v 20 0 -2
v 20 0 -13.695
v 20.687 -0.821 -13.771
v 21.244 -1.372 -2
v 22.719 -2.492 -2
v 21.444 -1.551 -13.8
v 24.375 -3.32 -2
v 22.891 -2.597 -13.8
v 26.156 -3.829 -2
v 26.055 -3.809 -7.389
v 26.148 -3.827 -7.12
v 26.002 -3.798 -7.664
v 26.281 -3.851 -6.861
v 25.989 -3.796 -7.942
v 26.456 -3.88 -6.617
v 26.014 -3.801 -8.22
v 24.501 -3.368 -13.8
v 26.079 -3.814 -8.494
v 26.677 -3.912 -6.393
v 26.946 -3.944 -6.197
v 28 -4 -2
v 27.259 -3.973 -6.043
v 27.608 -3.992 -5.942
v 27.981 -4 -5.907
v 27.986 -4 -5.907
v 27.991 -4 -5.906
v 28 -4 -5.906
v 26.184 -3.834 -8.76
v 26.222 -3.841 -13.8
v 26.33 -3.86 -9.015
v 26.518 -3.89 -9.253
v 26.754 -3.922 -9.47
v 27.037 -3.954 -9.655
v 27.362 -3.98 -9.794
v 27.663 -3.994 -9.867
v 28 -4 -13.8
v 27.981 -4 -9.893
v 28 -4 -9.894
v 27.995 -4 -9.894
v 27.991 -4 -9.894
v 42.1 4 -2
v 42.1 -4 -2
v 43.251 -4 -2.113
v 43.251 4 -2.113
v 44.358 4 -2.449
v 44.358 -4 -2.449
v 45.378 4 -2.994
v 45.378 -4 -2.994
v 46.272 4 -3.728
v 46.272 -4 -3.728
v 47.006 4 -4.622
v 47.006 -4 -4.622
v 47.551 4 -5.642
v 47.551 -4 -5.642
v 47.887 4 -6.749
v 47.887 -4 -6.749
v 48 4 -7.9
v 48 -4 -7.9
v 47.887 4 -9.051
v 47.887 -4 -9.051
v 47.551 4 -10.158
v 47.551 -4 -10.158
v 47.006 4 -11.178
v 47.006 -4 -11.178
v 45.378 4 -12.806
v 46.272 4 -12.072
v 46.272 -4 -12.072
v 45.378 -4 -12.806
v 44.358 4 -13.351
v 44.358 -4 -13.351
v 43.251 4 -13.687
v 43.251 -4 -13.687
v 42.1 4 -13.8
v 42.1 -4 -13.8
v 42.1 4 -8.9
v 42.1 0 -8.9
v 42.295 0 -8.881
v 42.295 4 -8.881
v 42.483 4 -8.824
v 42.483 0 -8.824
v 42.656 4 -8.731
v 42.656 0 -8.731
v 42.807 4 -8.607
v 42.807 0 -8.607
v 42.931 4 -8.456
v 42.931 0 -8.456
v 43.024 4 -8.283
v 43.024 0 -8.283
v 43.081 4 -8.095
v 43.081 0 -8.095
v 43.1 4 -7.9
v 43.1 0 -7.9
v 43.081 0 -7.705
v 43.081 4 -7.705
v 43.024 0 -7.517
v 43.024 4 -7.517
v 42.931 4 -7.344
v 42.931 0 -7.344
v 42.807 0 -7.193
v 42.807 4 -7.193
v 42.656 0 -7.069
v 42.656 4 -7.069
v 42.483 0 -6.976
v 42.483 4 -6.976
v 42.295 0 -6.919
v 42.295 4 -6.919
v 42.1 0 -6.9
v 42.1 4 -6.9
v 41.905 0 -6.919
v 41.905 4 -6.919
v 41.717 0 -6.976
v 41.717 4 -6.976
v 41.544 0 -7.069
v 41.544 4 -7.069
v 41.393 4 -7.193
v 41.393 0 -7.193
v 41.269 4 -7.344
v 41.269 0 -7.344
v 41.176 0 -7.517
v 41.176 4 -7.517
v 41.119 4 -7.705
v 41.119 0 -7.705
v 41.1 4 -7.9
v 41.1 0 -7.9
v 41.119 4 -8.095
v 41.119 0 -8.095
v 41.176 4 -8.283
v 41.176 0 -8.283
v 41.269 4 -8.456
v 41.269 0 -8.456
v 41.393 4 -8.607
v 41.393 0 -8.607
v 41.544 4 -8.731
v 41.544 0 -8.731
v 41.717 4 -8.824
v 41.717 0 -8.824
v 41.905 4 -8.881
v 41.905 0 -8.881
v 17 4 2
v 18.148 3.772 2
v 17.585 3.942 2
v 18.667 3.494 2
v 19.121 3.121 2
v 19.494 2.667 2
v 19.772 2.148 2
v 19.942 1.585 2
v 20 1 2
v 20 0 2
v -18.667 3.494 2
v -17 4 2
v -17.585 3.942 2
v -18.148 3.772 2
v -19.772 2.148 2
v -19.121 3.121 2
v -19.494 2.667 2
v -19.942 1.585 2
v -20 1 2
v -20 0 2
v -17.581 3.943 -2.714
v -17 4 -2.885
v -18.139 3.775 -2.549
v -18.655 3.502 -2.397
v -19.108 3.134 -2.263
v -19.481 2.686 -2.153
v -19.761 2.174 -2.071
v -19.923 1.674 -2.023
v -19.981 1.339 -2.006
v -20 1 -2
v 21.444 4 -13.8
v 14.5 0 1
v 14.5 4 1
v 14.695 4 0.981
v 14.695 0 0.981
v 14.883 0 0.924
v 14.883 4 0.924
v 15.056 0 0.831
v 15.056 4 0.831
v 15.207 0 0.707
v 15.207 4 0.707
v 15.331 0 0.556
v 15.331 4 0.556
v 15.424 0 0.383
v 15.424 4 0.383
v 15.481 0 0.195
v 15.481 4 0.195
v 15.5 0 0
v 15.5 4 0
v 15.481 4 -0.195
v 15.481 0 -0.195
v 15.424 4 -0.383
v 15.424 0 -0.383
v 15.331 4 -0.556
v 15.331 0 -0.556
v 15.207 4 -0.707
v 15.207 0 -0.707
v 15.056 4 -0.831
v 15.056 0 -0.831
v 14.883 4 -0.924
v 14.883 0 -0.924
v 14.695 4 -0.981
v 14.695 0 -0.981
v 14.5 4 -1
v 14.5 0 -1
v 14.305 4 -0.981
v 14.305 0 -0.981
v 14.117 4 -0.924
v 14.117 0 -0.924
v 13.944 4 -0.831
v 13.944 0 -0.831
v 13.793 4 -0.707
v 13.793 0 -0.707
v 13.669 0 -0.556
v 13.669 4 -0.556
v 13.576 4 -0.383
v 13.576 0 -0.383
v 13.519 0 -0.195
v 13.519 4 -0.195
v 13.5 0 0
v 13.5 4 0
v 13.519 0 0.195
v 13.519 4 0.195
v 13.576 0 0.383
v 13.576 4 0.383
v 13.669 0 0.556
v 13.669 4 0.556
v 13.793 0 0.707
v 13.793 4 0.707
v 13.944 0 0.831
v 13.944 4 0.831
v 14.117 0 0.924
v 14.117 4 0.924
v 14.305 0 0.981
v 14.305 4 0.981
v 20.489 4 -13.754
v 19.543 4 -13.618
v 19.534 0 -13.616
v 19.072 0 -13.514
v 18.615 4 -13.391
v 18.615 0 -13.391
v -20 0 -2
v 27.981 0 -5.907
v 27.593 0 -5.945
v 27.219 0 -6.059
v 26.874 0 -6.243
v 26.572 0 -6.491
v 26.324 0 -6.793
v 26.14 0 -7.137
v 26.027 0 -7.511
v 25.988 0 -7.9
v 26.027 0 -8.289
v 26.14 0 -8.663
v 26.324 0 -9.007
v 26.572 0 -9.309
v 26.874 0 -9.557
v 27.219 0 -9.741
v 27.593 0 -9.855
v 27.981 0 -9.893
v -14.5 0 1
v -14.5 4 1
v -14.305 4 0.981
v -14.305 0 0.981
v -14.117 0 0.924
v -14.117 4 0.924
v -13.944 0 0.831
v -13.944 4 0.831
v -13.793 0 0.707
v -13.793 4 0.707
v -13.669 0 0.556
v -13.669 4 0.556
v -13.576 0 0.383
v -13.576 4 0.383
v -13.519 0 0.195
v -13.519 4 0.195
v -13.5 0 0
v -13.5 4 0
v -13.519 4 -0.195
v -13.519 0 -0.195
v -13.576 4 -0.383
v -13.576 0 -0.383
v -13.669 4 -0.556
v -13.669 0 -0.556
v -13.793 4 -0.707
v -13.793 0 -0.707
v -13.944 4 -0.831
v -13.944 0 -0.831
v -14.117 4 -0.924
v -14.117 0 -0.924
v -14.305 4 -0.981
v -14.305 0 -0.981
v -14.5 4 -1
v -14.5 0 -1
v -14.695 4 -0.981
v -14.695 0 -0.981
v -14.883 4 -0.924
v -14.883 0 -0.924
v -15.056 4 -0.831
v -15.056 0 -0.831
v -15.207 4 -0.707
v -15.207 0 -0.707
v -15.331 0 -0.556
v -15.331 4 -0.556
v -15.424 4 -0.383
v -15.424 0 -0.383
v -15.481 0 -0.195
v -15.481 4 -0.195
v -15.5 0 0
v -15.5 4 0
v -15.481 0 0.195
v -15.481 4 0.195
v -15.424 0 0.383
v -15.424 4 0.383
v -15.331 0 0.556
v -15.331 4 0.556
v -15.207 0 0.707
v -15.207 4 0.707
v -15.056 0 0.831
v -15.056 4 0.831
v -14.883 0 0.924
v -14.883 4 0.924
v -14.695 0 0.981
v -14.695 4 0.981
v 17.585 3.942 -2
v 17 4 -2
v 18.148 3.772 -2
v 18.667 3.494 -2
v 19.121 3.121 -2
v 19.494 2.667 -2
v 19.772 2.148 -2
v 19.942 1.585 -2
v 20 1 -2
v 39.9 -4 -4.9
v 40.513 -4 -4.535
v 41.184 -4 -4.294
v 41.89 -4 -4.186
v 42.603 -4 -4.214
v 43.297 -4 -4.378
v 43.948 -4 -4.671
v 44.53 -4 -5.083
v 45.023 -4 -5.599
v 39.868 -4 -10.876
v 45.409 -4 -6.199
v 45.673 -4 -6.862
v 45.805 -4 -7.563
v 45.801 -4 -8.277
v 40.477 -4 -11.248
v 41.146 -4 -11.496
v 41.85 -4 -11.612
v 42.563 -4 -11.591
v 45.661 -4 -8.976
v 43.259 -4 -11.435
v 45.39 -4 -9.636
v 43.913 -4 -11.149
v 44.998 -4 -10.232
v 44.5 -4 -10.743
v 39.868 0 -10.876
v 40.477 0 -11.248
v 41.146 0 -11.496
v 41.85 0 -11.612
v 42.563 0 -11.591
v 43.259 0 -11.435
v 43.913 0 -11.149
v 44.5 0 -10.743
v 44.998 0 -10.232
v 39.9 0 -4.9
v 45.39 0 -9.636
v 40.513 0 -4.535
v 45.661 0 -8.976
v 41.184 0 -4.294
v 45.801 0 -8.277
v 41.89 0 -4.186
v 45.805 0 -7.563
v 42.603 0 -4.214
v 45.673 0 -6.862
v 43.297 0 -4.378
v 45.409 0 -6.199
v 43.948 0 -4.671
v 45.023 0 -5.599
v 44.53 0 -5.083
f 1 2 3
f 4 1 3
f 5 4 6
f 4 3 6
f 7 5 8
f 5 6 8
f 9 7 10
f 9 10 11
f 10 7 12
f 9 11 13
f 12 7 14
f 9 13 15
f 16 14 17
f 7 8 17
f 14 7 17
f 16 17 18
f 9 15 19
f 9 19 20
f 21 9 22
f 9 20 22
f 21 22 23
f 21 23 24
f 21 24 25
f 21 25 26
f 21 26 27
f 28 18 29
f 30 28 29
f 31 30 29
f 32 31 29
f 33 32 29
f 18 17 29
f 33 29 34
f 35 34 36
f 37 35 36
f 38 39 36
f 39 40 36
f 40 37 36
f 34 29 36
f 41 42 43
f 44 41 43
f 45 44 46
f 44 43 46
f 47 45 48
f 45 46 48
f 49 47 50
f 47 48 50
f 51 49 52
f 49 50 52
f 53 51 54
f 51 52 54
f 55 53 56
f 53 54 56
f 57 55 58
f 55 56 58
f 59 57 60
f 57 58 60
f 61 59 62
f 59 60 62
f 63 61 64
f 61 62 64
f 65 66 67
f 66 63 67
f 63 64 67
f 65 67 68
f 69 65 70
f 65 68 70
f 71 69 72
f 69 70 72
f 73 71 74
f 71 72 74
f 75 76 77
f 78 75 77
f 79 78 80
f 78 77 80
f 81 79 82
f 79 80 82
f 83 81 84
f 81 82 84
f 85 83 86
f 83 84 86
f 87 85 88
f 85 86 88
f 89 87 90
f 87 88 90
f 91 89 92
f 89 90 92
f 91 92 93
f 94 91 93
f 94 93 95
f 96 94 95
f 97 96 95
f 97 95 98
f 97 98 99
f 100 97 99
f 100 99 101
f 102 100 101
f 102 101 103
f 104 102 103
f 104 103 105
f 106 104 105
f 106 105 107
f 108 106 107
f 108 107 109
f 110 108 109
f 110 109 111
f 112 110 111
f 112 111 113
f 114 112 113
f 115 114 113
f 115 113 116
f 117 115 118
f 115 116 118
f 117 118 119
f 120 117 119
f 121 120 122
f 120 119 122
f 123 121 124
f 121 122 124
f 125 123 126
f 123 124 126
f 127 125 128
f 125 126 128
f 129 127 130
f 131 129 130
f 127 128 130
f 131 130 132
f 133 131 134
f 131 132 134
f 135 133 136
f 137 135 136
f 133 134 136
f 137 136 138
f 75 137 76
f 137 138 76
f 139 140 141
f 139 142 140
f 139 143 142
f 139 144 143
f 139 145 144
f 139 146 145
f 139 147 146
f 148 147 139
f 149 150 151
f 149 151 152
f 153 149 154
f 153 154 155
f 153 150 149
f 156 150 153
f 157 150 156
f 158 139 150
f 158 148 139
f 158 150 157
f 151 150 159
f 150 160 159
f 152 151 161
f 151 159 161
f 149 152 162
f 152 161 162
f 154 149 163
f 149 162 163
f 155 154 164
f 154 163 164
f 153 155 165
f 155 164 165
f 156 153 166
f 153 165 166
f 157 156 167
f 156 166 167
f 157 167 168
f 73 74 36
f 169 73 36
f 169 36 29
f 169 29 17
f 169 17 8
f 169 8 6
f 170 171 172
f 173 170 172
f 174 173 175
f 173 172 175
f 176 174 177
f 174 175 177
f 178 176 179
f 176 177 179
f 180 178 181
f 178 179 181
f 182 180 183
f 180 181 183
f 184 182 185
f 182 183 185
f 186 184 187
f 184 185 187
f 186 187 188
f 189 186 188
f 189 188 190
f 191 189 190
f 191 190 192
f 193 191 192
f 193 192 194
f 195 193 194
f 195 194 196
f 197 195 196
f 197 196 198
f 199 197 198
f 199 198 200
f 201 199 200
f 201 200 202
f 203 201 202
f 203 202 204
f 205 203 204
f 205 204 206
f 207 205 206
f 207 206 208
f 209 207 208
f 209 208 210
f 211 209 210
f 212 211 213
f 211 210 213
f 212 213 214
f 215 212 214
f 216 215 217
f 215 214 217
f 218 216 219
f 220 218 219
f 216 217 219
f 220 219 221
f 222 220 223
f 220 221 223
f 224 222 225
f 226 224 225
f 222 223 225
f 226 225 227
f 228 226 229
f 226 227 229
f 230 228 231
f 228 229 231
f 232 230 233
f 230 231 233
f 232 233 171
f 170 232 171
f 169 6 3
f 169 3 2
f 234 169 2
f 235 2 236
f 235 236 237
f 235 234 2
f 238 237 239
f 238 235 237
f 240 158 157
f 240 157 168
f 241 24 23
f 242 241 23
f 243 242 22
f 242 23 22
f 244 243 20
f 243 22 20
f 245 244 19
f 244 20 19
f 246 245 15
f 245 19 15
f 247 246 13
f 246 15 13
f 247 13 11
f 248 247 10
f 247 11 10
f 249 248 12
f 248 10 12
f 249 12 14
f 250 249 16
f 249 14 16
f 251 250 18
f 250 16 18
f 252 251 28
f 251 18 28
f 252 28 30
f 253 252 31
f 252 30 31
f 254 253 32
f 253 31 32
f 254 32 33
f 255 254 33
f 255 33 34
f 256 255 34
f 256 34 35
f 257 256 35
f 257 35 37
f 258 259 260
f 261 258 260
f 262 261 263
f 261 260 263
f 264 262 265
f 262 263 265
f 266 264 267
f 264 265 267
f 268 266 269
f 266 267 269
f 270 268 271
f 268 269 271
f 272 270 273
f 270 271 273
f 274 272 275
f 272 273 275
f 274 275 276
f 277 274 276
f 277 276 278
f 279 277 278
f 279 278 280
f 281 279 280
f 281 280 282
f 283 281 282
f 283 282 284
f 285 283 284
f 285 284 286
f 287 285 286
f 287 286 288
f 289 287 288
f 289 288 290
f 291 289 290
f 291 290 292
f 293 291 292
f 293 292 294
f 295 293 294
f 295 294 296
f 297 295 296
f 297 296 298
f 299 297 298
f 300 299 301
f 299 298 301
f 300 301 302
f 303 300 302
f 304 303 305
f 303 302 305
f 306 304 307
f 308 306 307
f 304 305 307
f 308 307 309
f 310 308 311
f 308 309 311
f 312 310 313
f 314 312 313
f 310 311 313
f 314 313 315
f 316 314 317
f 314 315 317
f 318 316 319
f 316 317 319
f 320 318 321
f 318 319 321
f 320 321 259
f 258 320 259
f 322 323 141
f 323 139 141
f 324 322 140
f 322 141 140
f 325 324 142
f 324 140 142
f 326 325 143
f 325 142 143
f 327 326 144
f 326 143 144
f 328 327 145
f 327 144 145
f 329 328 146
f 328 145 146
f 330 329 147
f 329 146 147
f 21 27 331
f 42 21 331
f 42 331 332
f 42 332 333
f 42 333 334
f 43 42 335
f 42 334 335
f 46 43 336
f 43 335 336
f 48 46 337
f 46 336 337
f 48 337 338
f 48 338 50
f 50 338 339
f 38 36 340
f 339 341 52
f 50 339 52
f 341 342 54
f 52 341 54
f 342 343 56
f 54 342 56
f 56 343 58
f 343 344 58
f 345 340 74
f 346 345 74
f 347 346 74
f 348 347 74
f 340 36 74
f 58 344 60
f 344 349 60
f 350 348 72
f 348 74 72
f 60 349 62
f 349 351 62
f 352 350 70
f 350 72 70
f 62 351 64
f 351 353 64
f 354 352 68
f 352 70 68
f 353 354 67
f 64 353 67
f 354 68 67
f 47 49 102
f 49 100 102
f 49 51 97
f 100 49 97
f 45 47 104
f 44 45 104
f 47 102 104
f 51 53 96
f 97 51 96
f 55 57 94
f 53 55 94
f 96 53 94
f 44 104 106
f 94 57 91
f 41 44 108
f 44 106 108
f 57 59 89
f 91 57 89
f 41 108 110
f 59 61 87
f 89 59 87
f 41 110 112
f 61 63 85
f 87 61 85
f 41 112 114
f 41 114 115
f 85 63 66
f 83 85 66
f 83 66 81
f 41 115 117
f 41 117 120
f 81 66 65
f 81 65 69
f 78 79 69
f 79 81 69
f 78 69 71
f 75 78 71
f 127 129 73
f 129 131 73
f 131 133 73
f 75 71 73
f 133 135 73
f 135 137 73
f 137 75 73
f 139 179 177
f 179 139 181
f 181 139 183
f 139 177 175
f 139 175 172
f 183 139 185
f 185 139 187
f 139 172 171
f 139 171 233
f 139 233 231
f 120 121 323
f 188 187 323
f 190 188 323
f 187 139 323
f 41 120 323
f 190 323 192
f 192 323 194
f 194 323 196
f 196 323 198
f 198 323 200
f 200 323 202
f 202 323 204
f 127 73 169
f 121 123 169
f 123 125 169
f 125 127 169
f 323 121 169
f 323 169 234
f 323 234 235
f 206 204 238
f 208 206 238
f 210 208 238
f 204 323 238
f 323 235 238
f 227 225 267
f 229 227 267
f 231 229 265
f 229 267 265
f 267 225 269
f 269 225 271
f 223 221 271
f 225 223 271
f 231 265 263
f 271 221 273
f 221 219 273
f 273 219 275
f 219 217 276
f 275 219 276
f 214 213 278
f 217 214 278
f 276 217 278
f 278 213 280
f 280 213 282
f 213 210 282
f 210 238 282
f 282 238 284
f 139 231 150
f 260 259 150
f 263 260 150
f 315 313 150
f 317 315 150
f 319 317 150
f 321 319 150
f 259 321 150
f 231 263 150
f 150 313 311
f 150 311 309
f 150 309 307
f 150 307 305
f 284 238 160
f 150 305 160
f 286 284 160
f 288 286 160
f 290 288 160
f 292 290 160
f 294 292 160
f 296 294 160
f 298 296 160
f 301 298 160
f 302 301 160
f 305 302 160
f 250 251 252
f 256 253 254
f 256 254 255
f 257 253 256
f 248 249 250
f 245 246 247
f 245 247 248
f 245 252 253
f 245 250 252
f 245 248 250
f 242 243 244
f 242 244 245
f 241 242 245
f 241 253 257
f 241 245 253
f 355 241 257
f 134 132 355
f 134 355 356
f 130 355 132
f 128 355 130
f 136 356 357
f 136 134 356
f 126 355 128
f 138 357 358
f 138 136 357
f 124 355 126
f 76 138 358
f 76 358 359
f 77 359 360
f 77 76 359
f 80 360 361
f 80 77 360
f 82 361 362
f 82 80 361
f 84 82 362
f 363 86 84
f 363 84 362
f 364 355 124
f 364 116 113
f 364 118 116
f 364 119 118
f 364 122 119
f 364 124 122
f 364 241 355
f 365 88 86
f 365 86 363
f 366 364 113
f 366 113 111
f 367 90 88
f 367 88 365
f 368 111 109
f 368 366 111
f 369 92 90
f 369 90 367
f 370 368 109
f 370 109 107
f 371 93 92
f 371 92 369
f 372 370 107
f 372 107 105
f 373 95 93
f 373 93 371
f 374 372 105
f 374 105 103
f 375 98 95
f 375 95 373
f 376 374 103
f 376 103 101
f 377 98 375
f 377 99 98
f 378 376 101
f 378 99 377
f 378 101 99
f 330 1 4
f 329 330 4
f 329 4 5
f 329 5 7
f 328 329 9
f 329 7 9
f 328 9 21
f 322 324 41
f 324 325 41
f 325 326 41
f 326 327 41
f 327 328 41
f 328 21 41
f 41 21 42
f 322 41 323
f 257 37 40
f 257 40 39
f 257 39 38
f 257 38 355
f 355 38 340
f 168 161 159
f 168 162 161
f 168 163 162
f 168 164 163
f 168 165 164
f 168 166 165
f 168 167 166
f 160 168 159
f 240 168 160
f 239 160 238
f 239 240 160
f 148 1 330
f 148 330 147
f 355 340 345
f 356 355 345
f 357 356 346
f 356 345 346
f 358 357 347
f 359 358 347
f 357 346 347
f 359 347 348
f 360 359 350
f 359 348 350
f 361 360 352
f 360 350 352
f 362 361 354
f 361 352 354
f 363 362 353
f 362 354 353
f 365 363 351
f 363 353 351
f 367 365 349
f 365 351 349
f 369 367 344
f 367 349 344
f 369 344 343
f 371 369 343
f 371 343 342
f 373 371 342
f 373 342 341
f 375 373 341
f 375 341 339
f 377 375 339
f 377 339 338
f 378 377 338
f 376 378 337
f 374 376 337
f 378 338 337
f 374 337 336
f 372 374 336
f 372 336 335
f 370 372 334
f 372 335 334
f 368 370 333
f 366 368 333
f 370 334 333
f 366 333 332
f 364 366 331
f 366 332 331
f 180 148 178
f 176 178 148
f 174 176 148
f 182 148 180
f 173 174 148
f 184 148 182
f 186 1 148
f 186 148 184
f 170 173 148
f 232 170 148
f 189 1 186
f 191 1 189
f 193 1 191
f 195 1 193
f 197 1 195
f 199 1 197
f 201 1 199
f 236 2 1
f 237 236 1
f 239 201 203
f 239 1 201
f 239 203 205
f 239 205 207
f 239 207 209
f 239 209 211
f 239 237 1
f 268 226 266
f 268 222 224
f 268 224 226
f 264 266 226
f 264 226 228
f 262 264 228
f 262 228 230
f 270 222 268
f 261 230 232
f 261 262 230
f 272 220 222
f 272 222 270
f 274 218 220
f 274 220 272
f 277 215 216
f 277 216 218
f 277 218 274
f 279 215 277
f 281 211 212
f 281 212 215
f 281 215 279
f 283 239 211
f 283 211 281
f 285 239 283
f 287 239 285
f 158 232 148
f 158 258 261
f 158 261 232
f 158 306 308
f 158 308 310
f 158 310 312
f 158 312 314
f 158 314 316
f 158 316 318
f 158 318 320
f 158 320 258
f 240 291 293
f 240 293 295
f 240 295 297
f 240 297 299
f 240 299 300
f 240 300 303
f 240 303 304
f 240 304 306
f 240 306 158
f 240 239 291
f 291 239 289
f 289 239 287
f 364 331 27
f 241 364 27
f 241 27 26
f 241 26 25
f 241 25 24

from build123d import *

# Parameters (mm, degrees)
BOSS_EXTRUDE2_DEPTH = 4
BOSS_EXTRUDE3_START = 4
BOSS_EXTRUDE3_DEPTH = 4
CUT_EXTRUDE1_DEPTH  = 4
SKETCH7_R           = 1
CUT_EXTRUDE2_DEPTH  = 51.104291233
SKETCH9_R           = 1
CUT_EXTRUDE8_DEPTH  = 51.58102411
FILLET1_R           = 10
FILLET2_R           = 10
FILLET3_R           = 3


with BuildPart() as part:
    # Sketch1 → Boss-Extrude2 (new body)
    with BuildSketch(Plane(origin=(0, 0, 0), x_dir=(1, 0, 0), z_dir=(0, 1, 0))):
        with BuildLine():
            Line((-20, 2), (20, 13.8))
            Line((20, 13.8), (42.1, 13.8))
            ThreePointArc((42.1, 13.8), (48, 7.9), (42.1, 2))
            Line((42.1, 2), (20, 2))
            Line((20, 2), (20, -2))
            Line((20, -2), (-20, -2))
            Line((-20, -2), (-20, 2))
        make_face()
    extrude(amount=BOSS_EXTRUDE2_DEPTH)

    # Sketch4 → Boss-Extrude3 (add)
    with BuildSketch(Plane(origin=(0, 0, 0), x_dir=(-1, 0, 0), z_dir=(0, -1, 0)).offset(BOSS_EXTRUDE3_START)):
        with BuildLine():
            Line((-20, 2), (-42.1, 2))
            ThreePointArc((-42.1, 2), (-48, 7.9), (-42.1, 13.8))
            Line((-42.1, 13.8), (-20, 13.8))
            Line((-20, 13.8), (-20, 2))
        make_face()
    extrude(amount=-BOSS_EXTRUDE3_DEPTH)

    # Sketch6 → Cut-Extrude1 (cut)
    with BuildSketch(Plane.XZ.offset(4)):
        with BuildLine():
            Line((39.899748285, -4.9), (27.981348848, -5.907102203))
            ThreePointArc((27.981348848, -5.907102203), (25.988451051, -7.9), (27.981348848, -9.892897797))
            Line((27.981348848, -9.892897797), (39.867781655, -10.876291126))
            ThreePointArc((39.867781655, -10.876291126), (45.820310688, -7.919899599), (39.899748285, -4.9))
        make_face()
    extrude(amount=-CUT_EXTRUDE1_DEPTH, mode=Mode.SUBTRACT)

    # Sketch7 → Cut-Extrude2 (cut, through all)
    with BuildSketch(Plane.XZ):
        with Locations(Location((42.1, -7.9, 0), (0, 0, 270))):
            Circle(SKETCH7_R)
    extrude(amount=-CUT_EXTRUDE2_DEPTH, mode=Mode.SUBTRACT)

    # Sketch9 → Cut-Extrude8 (cut, through all)
    with BuildSketch(Plane(origin=(0, 4, 0), x_dir=(1, 0, 0), z_dir=(0, 1, 0))):
        with Locations(Location((-14.5, 0, 0), (0, 0, 270))):
            Circle(SKETCH9_R)
        with Locations(Location((14.5, 0, 0), (0, 0, 270))):
            Circle(SKETCH9_R)
    extrude(amount=-CUT_EXTRUDE8_DEPTH, mode=Mode.SUBTRACT)

    # Fillet1
    # the kernel refuses this fillet: 10 mm, written as the material it takes off along each edge
    with BuildSketch(Plane(origin=(20, -4, -33.8), x_dir=(1, 0, 0), z_dir=(0, 0, 1))) as fillet1_piece_1:
        with BuildLine():
            CenterArc((8, 10), FILLET1_R, 216.869897646, 53.130102354)
            Line((0, 4), (-0.16, 3.88))
            ThreePointArc((-0.16, 3.88), (-0.2, 2), (-0.2, 0))
            Line((-0.2, 0), (0, -0.2))
            Line((0, -0.2), (8, -0.2))
            Line((8, -0.2), (8, 0))
        make_face()
    extrude(amount=51.8, mode=Mode.SUBTRACT)

    # Fillet2
    fillet2_edges = [part.edges().sort_by_distance(p)[0] for p in [
        (20, 2, -13.8),
    ]]
    fillet(fillet2_edges, radius=FILLET2_R)

    # Fillet3
    fillet3_edges = [part.edges().sort_by_distance(p)[0] for p in [
        (-20, 4, 0),
        (20, 4, 0),
    ]]
    fillet(fillet3_edges, radius=FILLET3_R)


solid = part.part
